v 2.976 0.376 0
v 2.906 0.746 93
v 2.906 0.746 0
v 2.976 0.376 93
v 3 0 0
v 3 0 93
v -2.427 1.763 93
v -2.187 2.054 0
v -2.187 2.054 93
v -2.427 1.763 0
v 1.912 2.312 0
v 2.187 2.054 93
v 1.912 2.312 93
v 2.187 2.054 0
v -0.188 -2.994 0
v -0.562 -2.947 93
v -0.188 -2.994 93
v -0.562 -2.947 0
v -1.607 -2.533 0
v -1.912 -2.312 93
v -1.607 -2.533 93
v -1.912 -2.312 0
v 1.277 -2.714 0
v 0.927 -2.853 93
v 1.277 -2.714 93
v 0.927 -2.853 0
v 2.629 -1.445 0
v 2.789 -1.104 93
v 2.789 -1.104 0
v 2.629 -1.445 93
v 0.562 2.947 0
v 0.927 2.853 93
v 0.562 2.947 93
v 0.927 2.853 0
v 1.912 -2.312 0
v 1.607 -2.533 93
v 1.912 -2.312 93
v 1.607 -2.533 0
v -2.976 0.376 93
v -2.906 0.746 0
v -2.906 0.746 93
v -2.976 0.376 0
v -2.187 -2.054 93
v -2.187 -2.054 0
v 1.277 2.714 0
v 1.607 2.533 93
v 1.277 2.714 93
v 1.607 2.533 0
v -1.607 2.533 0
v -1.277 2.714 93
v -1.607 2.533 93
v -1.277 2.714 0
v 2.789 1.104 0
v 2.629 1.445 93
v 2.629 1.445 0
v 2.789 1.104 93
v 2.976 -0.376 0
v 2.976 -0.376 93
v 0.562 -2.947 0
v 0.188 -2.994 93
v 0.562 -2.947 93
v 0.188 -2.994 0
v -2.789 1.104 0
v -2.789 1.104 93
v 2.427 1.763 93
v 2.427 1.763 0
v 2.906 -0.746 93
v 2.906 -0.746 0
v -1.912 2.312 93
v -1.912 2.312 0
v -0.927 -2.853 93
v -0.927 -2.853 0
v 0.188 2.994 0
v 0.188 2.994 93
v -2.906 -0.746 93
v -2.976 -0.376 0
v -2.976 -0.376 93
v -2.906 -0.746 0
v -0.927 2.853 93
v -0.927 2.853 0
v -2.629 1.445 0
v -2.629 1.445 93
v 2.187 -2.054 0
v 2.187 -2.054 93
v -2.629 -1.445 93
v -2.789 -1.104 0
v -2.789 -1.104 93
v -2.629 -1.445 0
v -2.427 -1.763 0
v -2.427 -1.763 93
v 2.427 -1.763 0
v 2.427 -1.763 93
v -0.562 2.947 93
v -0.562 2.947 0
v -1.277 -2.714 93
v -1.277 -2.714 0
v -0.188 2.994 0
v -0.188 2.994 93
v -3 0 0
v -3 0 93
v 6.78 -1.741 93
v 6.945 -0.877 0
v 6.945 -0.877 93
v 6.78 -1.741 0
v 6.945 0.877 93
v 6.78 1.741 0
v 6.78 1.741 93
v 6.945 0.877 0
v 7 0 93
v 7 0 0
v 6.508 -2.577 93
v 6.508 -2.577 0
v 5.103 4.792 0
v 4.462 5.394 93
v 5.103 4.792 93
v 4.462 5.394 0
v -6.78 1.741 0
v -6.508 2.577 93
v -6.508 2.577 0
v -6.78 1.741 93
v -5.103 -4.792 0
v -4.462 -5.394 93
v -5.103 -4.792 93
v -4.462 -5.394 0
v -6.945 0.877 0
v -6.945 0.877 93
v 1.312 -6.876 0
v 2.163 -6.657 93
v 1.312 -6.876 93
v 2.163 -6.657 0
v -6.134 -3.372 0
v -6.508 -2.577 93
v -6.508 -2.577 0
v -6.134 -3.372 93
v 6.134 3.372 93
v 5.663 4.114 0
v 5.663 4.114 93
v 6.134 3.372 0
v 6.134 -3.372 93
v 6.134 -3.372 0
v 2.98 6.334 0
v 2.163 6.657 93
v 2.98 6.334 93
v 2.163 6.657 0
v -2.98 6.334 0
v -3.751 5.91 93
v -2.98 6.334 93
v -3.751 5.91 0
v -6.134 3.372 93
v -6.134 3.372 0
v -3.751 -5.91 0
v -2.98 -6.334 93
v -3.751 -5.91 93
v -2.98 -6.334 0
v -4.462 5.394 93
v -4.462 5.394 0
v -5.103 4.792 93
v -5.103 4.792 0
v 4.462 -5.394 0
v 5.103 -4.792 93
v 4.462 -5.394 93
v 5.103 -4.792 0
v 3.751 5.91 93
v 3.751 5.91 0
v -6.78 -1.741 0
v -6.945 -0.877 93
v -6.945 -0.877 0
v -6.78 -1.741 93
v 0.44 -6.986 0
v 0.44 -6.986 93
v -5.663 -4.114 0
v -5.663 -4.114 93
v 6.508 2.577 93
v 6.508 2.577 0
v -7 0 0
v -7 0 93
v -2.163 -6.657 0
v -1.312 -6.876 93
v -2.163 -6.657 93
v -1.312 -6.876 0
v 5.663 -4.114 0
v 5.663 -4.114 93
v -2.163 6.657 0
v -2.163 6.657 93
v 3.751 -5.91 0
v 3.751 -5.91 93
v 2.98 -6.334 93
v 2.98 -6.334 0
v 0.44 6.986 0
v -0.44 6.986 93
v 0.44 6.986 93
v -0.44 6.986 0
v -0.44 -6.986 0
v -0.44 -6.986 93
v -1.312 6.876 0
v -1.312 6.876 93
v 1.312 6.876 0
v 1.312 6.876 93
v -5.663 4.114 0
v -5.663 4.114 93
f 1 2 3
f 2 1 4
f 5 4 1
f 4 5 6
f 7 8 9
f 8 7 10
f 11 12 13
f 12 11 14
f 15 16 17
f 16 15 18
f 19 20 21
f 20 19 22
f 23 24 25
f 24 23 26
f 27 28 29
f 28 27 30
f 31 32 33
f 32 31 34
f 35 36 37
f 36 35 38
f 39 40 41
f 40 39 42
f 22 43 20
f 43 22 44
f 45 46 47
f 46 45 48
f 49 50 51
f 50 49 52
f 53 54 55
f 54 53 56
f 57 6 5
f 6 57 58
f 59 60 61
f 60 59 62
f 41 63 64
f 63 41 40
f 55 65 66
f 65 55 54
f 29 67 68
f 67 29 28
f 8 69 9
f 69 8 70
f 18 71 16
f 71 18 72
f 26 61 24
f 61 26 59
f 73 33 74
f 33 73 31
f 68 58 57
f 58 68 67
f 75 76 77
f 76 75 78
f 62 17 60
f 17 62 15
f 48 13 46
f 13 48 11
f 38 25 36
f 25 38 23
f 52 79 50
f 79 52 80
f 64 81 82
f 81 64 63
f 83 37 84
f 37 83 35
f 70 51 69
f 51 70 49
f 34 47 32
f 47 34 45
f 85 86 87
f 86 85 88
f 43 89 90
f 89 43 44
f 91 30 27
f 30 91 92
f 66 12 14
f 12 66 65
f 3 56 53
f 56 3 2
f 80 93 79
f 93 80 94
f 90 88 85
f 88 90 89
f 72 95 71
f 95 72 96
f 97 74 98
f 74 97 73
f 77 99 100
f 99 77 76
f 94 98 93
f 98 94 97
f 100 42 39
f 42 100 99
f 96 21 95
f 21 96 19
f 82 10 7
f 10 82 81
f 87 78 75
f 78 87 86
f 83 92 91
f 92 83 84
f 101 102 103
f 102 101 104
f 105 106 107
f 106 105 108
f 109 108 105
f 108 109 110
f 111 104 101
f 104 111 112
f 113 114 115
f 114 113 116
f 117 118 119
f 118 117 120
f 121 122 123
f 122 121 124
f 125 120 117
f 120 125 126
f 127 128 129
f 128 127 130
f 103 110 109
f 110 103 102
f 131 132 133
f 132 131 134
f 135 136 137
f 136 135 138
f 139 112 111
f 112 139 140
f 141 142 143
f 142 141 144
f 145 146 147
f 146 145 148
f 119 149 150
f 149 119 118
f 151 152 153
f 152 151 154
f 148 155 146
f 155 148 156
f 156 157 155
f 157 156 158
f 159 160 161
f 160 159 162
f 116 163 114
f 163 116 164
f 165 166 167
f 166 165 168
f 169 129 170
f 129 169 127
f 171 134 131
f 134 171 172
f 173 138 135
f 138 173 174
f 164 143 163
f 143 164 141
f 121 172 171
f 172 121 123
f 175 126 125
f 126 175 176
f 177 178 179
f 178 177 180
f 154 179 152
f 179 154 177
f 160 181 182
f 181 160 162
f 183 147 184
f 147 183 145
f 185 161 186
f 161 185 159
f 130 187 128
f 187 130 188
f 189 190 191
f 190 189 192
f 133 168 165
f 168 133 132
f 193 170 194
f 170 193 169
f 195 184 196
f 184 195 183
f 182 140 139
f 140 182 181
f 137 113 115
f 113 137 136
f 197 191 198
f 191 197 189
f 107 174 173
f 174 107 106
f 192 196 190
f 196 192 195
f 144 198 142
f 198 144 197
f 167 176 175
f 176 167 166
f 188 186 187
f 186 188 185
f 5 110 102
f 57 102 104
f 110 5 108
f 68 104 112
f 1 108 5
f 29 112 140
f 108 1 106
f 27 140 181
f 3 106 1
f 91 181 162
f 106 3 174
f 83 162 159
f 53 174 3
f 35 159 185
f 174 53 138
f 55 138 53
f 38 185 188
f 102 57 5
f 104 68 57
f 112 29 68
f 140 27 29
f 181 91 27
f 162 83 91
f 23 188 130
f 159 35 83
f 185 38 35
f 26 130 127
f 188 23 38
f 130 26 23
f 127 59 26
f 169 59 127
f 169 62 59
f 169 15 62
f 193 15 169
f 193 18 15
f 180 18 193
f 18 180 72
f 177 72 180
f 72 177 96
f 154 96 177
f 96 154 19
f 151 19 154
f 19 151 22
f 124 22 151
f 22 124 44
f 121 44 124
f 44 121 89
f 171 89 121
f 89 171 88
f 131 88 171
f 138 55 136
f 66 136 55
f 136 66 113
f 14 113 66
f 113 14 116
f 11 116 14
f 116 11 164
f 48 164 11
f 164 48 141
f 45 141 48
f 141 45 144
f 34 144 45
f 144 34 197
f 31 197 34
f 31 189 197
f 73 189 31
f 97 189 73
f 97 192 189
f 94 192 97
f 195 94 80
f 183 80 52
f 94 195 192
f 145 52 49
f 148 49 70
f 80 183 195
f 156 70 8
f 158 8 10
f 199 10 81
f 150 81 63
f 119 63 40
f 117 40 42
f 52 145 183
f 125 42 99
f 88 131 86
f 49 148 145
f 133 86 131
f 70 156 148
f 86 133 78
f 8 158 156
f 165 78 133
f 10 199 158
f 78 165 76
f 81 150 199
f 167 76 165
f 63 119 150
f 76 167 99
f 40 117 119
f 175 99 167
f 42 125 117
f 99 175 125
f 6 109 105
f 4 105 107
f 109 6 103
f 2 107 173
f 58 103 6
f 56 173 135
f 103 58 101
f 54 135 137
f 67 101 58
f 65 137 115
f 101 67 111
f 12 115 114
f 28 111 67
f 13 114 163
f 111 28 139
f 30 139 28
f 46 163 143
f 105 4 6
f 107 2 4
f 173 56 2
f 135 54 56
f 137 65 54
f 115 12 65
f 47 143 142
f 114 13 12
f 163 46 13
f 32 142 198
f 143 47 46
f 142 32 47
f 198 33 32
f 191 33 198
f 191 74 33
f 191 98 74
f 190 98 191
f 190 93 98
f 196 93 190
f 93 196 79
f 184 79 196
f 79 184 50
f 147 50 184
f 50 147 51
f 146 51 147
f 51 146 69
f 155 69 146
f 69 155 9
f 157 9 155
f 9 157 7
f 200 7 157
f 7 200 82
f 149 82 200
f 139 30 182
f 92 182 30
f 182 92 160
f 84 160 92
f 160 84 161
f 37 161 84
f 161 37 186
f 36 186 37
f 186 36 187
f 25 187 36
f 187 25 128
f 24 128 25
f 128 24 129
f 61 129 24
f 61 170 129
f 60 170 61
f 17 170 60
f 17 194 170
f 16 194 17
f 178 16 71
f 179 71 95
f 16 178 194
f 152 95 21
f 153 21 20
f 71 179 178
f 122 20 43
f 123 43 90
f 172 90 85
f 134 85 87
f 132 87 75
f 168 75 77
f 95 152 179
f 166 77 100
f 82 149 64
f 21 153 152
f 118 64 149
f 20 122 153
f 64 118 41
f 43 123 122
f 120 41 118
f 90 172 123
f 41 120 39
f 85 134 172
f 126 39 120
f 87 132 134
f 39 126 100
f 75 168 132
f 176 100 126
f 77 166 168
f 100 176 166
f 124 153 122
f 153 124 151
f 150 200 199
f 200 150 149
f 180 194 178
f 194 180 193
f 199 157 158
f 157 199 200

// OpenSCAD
$fn = 50;


difference() {
	union() {
		cylinder(h = 93, r = 7.0000000000);
	}
	union() {
		translate(v = [0.0000000000, 0.0000000000, -100.0000000000]) {
			cylinder(h = 200, r = 3.0000000000);
		}
		cylinder(h = 93, r = 1.5000000000);
		cylinder(h = 93, r = 1.5000000000);
		cylinder(h = 93, r = 1.5000000000);
	}
}
